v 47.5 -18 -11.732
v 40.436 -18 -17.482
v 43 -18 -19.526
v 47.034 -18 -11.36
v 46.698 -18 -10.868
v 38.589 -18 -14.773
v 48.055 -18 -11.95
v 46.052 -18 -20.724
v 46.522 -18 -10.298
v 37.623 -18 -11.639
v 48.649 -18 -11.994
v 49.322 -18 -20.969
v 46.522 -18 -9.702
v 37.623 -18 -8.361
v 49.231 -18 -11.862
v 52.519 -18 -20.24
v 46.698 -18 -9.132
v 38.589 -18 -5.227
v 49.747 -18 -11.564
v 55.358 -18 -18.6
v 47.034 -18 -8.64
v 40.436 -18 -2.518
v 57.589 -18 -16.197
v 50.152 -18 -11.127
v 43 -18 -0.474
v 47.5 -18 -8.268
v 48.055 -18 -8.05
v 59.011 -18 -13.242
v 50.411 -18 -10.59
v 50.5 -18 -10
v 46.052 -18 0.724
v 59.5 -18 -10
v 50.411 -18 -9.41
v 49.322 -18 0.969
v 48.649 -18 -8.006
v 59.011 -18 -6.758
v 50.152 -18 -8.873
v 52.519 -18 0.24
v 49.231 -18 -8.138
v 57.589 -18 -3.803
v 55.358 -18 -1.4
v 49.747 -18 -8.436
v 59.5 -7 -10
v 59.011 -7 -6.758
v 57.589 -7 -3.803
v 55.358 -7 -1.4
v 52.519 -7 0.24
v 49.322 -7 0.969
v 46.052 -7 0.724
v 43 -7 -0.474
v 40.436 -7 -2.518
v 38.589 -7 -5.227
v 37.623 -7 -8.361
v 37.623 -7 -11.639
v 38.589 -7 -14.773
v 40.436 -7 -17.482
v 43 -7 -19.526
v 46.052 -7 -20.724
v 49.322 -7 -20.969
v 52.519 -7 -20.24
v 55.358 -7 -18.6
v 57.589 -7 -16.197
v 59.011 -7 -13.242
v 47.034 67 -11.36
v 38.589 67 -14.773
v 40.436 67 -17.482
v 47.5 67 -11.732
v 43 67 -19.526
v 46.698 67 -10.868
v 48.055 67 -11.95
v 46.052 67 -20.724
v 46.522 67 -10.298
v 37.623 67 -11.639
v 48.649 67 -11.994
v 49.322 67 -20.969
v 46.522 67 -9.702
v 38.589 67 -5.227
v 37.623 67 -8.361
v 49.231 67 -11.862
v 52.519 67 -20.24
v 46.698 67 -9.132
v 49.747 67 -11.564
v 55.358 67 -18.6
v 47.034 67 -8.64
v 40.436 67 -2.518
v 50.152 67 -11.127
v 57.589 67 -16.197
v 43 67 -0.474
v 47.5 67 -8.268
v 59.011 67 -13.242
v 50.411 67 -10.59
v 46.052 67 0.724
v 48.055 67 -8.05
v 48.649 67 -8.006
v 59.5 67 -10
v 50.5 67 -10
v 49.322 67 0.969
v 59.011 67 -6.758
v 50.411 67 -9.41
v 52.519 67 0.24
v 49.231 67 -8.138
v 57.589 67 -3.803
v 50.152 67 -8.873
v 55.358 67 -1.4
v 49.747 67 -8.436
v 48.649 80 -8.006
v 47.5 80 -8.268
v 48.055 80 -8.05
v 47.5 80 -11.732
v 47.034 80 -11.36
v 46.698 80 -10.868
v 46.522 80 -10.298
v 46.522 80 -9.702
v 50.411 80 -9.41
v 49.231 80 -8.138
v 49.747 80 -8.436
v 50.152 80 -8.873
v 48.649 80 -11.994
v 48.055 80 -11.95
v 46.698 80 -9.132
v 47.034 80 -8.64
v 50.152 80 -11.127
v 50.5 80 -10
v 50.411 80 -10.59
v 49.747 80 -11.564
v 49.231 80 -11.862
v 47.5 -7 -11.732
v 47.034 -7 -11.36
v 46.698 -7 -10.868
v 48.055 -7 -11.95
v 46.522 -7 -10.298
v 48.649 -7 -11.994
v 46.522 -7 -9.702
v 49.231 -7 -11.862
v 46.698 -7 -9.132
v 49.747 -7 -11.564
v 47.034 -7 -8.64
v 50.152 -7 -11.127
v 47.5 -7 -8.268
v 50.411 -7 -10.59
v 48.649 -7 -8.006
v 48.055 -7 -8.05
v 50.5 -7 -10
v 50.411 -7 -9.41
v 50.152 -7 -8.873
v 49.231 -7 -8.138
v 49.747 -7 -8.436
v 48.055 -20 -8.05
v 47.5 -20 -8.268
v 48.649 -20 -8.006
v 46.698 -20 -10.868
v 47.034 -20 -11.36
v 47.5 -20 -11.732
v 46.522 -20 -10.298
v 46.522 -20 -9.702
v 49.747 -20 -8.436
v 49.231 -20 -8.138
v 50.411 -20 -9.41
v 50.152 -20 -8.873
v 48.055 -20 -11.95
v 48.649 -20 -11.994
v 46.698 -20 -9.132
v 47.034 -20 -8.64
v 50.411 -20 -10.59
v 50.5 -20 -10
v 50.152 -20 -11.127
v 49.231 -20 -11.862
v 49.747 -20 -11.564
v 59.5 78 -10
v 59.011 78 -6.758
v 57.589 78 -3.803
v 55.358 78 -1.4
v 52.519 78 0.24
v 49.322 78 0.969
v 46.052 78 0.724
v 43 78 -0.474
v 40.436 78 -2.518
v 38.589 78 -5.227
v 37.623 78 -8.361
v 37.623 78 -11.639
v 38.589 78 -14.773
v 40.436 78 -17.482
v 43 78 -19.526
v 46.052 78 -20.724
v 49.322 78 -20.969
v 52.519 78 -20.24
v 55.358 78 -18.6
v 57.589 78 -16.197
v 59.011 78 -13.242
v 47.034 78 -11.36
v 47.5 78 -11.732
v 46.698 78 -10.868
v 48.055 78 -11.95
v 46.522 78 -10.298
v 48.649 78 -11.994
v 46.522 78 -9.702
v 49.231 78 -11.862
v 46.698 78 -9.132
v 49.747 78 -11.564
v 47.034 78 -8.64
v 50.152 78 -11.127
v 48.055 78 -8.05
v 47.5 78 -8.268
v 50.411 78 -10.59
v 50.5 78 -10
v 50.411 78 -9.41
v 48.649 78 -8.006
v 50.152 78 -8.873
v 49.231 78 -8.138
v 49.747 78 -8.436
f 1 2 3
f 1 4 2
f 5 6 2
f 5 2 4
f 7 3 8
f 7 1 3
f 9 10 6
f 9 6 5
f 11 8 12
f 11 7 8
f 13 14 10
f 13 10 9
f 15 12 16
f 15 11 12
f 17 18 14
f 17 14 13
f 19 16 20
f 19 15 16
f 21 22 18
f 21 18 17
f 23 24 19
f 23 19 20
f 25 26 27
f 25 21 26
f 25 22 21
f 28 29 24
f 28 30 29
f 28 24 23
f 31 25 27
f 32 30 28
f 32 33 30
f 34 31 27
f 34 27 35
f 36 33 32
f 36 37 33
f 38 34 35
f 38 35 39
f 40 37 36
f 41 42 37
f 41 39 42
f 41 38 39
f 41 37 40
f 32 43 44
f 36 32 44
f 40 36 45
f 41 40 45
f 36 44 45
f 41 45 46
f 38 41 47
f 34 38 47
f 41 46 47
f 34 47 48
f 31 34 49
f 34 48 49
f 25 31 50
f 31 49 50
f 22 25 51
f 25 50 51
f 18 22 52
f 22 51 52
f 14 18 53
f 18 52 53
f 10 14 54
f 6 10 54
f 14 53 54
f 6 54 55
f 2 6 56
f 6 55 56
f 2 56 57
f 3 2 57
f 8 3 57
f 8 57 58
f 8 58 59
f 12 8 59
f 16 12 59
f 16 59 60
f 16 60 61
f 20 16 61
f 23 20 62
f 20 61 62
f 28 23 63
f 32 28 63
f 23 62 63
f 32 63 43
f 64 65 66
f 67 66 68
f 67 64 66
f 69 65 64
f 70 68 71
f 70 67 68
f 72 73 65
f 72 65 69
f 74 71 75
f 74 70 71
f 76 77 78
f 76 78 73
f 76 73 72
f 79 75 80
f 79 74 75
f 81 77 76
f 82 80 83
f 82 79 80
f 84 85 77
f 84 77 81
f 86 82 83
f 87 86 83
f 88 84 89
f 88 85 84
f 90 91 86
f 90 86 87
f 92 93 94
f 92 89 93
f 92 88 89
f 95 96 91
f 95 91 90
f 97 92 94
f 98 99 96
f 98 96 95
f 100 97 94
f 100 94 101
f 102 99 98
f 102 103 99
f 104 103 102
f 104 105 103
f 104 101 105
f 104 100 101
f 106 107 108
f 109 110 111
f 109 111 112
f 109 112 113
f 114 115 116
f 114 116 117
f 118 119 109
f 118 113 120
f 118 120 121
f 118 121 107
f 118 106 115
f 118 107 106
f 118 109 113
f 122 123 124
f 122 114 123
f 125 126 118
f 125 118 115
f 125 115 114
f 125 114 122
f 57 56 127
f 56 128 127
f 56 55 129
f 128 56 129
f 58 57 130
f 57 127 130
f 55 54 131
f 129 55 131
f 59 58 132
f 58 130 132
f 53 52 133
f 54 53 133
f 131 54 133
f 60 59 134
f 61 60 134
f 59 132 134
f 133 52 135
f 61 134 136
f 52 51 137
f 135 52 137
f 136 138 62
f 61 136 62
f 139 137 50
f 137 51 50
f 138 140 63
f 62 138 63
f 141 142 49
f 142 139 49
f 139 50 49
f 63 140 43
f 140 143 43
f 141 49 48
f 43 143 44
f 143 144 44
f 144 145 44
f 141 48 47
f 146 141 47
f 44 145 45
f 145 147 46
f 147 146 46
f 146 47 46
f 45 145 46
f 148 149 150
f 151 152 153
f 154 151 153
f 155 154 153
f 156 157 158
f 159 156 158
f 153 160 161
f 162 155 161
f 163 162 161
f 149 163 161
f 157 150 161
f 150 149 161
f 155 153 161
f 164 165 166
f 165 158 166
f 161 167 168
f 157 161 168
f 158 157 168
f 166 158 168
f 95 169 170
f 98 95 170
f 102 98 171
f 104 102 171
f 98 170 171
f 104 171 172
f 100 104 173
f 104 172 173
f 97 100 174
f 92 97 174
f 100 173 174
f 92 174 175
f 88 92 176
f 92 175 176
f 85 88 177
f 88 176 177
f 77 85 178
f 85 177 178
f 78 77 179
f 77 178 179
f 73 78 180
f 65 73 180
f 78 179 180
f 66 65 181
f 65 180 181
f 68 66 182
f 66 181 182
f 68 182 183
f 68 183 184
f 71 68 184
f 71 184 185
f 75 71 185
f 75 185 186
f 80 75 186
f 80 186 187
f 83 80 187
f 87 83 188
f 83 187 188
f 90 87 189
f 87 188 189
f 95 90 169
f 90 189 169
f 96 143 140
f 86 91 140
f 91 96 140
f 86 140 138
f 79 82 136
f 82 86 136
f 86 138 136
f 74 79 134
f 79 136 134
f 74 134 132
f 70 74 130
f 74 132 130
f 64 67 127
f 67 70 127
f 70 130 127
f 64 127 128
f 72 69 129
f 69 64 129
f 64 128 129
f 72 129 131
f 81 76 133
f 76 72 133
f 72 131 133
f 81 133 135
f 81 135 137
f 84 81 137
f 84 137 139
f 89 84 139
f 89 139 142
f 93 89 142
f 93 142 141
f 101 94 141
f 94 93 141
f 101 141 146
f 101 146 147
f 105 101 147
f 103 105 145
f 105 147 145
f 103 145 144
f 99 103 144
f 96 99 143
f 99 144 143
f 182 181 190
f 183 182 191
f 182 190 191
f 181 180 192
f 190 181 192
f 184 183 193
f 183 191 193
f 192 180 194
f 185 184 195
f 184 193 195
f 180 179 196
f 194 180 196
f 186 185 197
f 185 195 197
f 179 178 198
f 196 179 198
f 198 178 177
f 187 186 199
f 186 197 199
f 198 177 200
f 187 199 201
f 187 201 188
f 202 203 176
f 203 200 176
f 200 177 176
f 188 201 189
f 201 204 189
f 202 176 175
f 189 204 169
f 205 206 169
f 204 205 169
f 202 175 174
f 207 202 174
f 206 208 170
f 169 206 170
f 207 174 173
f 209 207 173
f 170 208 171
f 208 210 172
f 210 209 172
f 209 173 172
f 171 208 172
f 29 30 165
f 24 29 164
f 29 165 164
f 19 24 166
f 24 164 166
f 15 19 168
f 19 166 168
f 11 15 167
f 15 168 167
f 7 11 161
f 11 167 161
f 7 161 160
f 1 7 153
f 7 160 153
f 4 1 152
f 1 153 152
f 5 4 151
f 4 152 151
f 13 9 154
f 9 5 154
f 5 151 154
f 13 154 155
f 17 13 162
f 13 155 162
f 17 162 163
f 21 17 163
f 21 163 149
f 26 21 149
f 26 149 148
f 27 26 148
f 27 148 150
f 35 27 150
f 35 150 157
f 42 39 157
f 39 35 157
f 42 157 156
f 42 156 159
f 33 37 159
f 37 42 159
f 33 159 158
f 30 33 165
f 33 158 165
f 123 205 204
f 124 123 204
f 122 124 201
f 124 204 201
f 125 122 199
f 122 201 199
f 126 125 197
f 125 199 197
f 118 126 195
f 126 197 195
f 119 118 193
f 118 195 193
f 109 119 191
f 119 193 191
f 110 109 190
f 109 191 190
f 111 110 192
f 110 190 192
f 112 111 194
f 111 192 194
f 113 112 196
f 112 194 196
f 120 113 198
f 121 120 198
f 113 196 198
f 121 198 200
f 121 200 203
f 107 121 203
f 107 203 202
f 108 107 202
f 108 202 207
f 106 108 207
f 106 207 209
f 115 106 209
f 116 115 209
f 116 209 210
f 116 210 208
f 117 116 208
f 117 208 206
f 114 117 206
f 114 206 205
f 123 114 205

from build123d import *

# Parameters (mm, degrees)
CYLINDER002001001002_R             = 11
CYLINDER002001001002_DEPTH         = 11
CYLINDER002001001002_ROLL_ANGLE    = 90
CYLINDER002001001002001_R          = 11
CYLINDER002001001002001_DEPTH      = 11
CYLINDER002001001002001_ROLL_ANGLE = 90
CYLINDER002001002001_R             = 2
CYLINDER002001002001_DEPTH         = 100
CYLINDER002001002001_ROLL_ANGLE    = -90


with BuildPart() as wheel006:
    # Cylinder002001001002 → Cylinder002001001002 (new body)
    with BuildSketch(Plane.XY):
        Circle(CYLINDER002001001002_R)
    extrude(amount=CYLINDER002001001002_DEPTH)


with BuildPart() as wheel006_1:
    # Cylinder002001001002 roll: moved
    add(wheel006.part.rotate(Axis((0, 0, 0), (1, 0, 0)), CYLINDER002001001002_ROLL_ANGLE))


with BuildPart() as wheel006_2:
    # Cylinder002001001002 placement: moved
    add(wheel006_1.part.moved(Location((20, 78, 14))))


with BuildPart() as wheel007:
    # Cylinder002001001002001 → Cylinder002001001002001 (new body)
    with BuildSketch(Plane.XY):
        Circle(CYLINDER002001001002001_R)
    extrude(amount=CYLINDER002001001002001_DEPTH)


with BuildPart() as wheel007_1:
    # Cylinder002001001002001 roll: moved
    add(wheel007.part.rotate(Axis((0, 0, 0), (1, 0, 0)), CYLINDER002001001002001_ROLL_ANGLE))


with BuildPart() as wheel007_2:
    # Cylinder002001001002001 placement: moved
    add(wheel007_1.part.moved(Location((20, -7, 14))))


with BuildPart() as swheelset1:
    # Cylinder002001002001 → Cylinder002001002001 (new body)
    with BuildSketch(Plane.XY):
        Circle(CYLINDER002001002001_R)
    extrude(amount=CYLINDER002001002001_DEPTH)


with BuildPart() as swheelset1_1:
    # Cylinder002001002001 roll: moved
    add(swheelset1.part.rotate(Axis((0, 0, 0), (1, 0, 0)), CYLINDER002001002001_ROLL_ANGLE))


with BuildPart() as swheelset1_2:
    # Cylinder002001002001 placement: moved
    add(swheelset1_1.part.moved(Location((20, -20, 14))))

    # Fusion002001002002002: union Wheel006, Wheel007
    add(wheel006_2.part)
    add(wheel007_2.part)


with BuildPart() as swheelset1_3:
    # Fusion002001002002002 placement: moved
    add(swheelset1_2.part.moved(Location((28.5, 0, -24))))


solid = swheelset1_3.part
